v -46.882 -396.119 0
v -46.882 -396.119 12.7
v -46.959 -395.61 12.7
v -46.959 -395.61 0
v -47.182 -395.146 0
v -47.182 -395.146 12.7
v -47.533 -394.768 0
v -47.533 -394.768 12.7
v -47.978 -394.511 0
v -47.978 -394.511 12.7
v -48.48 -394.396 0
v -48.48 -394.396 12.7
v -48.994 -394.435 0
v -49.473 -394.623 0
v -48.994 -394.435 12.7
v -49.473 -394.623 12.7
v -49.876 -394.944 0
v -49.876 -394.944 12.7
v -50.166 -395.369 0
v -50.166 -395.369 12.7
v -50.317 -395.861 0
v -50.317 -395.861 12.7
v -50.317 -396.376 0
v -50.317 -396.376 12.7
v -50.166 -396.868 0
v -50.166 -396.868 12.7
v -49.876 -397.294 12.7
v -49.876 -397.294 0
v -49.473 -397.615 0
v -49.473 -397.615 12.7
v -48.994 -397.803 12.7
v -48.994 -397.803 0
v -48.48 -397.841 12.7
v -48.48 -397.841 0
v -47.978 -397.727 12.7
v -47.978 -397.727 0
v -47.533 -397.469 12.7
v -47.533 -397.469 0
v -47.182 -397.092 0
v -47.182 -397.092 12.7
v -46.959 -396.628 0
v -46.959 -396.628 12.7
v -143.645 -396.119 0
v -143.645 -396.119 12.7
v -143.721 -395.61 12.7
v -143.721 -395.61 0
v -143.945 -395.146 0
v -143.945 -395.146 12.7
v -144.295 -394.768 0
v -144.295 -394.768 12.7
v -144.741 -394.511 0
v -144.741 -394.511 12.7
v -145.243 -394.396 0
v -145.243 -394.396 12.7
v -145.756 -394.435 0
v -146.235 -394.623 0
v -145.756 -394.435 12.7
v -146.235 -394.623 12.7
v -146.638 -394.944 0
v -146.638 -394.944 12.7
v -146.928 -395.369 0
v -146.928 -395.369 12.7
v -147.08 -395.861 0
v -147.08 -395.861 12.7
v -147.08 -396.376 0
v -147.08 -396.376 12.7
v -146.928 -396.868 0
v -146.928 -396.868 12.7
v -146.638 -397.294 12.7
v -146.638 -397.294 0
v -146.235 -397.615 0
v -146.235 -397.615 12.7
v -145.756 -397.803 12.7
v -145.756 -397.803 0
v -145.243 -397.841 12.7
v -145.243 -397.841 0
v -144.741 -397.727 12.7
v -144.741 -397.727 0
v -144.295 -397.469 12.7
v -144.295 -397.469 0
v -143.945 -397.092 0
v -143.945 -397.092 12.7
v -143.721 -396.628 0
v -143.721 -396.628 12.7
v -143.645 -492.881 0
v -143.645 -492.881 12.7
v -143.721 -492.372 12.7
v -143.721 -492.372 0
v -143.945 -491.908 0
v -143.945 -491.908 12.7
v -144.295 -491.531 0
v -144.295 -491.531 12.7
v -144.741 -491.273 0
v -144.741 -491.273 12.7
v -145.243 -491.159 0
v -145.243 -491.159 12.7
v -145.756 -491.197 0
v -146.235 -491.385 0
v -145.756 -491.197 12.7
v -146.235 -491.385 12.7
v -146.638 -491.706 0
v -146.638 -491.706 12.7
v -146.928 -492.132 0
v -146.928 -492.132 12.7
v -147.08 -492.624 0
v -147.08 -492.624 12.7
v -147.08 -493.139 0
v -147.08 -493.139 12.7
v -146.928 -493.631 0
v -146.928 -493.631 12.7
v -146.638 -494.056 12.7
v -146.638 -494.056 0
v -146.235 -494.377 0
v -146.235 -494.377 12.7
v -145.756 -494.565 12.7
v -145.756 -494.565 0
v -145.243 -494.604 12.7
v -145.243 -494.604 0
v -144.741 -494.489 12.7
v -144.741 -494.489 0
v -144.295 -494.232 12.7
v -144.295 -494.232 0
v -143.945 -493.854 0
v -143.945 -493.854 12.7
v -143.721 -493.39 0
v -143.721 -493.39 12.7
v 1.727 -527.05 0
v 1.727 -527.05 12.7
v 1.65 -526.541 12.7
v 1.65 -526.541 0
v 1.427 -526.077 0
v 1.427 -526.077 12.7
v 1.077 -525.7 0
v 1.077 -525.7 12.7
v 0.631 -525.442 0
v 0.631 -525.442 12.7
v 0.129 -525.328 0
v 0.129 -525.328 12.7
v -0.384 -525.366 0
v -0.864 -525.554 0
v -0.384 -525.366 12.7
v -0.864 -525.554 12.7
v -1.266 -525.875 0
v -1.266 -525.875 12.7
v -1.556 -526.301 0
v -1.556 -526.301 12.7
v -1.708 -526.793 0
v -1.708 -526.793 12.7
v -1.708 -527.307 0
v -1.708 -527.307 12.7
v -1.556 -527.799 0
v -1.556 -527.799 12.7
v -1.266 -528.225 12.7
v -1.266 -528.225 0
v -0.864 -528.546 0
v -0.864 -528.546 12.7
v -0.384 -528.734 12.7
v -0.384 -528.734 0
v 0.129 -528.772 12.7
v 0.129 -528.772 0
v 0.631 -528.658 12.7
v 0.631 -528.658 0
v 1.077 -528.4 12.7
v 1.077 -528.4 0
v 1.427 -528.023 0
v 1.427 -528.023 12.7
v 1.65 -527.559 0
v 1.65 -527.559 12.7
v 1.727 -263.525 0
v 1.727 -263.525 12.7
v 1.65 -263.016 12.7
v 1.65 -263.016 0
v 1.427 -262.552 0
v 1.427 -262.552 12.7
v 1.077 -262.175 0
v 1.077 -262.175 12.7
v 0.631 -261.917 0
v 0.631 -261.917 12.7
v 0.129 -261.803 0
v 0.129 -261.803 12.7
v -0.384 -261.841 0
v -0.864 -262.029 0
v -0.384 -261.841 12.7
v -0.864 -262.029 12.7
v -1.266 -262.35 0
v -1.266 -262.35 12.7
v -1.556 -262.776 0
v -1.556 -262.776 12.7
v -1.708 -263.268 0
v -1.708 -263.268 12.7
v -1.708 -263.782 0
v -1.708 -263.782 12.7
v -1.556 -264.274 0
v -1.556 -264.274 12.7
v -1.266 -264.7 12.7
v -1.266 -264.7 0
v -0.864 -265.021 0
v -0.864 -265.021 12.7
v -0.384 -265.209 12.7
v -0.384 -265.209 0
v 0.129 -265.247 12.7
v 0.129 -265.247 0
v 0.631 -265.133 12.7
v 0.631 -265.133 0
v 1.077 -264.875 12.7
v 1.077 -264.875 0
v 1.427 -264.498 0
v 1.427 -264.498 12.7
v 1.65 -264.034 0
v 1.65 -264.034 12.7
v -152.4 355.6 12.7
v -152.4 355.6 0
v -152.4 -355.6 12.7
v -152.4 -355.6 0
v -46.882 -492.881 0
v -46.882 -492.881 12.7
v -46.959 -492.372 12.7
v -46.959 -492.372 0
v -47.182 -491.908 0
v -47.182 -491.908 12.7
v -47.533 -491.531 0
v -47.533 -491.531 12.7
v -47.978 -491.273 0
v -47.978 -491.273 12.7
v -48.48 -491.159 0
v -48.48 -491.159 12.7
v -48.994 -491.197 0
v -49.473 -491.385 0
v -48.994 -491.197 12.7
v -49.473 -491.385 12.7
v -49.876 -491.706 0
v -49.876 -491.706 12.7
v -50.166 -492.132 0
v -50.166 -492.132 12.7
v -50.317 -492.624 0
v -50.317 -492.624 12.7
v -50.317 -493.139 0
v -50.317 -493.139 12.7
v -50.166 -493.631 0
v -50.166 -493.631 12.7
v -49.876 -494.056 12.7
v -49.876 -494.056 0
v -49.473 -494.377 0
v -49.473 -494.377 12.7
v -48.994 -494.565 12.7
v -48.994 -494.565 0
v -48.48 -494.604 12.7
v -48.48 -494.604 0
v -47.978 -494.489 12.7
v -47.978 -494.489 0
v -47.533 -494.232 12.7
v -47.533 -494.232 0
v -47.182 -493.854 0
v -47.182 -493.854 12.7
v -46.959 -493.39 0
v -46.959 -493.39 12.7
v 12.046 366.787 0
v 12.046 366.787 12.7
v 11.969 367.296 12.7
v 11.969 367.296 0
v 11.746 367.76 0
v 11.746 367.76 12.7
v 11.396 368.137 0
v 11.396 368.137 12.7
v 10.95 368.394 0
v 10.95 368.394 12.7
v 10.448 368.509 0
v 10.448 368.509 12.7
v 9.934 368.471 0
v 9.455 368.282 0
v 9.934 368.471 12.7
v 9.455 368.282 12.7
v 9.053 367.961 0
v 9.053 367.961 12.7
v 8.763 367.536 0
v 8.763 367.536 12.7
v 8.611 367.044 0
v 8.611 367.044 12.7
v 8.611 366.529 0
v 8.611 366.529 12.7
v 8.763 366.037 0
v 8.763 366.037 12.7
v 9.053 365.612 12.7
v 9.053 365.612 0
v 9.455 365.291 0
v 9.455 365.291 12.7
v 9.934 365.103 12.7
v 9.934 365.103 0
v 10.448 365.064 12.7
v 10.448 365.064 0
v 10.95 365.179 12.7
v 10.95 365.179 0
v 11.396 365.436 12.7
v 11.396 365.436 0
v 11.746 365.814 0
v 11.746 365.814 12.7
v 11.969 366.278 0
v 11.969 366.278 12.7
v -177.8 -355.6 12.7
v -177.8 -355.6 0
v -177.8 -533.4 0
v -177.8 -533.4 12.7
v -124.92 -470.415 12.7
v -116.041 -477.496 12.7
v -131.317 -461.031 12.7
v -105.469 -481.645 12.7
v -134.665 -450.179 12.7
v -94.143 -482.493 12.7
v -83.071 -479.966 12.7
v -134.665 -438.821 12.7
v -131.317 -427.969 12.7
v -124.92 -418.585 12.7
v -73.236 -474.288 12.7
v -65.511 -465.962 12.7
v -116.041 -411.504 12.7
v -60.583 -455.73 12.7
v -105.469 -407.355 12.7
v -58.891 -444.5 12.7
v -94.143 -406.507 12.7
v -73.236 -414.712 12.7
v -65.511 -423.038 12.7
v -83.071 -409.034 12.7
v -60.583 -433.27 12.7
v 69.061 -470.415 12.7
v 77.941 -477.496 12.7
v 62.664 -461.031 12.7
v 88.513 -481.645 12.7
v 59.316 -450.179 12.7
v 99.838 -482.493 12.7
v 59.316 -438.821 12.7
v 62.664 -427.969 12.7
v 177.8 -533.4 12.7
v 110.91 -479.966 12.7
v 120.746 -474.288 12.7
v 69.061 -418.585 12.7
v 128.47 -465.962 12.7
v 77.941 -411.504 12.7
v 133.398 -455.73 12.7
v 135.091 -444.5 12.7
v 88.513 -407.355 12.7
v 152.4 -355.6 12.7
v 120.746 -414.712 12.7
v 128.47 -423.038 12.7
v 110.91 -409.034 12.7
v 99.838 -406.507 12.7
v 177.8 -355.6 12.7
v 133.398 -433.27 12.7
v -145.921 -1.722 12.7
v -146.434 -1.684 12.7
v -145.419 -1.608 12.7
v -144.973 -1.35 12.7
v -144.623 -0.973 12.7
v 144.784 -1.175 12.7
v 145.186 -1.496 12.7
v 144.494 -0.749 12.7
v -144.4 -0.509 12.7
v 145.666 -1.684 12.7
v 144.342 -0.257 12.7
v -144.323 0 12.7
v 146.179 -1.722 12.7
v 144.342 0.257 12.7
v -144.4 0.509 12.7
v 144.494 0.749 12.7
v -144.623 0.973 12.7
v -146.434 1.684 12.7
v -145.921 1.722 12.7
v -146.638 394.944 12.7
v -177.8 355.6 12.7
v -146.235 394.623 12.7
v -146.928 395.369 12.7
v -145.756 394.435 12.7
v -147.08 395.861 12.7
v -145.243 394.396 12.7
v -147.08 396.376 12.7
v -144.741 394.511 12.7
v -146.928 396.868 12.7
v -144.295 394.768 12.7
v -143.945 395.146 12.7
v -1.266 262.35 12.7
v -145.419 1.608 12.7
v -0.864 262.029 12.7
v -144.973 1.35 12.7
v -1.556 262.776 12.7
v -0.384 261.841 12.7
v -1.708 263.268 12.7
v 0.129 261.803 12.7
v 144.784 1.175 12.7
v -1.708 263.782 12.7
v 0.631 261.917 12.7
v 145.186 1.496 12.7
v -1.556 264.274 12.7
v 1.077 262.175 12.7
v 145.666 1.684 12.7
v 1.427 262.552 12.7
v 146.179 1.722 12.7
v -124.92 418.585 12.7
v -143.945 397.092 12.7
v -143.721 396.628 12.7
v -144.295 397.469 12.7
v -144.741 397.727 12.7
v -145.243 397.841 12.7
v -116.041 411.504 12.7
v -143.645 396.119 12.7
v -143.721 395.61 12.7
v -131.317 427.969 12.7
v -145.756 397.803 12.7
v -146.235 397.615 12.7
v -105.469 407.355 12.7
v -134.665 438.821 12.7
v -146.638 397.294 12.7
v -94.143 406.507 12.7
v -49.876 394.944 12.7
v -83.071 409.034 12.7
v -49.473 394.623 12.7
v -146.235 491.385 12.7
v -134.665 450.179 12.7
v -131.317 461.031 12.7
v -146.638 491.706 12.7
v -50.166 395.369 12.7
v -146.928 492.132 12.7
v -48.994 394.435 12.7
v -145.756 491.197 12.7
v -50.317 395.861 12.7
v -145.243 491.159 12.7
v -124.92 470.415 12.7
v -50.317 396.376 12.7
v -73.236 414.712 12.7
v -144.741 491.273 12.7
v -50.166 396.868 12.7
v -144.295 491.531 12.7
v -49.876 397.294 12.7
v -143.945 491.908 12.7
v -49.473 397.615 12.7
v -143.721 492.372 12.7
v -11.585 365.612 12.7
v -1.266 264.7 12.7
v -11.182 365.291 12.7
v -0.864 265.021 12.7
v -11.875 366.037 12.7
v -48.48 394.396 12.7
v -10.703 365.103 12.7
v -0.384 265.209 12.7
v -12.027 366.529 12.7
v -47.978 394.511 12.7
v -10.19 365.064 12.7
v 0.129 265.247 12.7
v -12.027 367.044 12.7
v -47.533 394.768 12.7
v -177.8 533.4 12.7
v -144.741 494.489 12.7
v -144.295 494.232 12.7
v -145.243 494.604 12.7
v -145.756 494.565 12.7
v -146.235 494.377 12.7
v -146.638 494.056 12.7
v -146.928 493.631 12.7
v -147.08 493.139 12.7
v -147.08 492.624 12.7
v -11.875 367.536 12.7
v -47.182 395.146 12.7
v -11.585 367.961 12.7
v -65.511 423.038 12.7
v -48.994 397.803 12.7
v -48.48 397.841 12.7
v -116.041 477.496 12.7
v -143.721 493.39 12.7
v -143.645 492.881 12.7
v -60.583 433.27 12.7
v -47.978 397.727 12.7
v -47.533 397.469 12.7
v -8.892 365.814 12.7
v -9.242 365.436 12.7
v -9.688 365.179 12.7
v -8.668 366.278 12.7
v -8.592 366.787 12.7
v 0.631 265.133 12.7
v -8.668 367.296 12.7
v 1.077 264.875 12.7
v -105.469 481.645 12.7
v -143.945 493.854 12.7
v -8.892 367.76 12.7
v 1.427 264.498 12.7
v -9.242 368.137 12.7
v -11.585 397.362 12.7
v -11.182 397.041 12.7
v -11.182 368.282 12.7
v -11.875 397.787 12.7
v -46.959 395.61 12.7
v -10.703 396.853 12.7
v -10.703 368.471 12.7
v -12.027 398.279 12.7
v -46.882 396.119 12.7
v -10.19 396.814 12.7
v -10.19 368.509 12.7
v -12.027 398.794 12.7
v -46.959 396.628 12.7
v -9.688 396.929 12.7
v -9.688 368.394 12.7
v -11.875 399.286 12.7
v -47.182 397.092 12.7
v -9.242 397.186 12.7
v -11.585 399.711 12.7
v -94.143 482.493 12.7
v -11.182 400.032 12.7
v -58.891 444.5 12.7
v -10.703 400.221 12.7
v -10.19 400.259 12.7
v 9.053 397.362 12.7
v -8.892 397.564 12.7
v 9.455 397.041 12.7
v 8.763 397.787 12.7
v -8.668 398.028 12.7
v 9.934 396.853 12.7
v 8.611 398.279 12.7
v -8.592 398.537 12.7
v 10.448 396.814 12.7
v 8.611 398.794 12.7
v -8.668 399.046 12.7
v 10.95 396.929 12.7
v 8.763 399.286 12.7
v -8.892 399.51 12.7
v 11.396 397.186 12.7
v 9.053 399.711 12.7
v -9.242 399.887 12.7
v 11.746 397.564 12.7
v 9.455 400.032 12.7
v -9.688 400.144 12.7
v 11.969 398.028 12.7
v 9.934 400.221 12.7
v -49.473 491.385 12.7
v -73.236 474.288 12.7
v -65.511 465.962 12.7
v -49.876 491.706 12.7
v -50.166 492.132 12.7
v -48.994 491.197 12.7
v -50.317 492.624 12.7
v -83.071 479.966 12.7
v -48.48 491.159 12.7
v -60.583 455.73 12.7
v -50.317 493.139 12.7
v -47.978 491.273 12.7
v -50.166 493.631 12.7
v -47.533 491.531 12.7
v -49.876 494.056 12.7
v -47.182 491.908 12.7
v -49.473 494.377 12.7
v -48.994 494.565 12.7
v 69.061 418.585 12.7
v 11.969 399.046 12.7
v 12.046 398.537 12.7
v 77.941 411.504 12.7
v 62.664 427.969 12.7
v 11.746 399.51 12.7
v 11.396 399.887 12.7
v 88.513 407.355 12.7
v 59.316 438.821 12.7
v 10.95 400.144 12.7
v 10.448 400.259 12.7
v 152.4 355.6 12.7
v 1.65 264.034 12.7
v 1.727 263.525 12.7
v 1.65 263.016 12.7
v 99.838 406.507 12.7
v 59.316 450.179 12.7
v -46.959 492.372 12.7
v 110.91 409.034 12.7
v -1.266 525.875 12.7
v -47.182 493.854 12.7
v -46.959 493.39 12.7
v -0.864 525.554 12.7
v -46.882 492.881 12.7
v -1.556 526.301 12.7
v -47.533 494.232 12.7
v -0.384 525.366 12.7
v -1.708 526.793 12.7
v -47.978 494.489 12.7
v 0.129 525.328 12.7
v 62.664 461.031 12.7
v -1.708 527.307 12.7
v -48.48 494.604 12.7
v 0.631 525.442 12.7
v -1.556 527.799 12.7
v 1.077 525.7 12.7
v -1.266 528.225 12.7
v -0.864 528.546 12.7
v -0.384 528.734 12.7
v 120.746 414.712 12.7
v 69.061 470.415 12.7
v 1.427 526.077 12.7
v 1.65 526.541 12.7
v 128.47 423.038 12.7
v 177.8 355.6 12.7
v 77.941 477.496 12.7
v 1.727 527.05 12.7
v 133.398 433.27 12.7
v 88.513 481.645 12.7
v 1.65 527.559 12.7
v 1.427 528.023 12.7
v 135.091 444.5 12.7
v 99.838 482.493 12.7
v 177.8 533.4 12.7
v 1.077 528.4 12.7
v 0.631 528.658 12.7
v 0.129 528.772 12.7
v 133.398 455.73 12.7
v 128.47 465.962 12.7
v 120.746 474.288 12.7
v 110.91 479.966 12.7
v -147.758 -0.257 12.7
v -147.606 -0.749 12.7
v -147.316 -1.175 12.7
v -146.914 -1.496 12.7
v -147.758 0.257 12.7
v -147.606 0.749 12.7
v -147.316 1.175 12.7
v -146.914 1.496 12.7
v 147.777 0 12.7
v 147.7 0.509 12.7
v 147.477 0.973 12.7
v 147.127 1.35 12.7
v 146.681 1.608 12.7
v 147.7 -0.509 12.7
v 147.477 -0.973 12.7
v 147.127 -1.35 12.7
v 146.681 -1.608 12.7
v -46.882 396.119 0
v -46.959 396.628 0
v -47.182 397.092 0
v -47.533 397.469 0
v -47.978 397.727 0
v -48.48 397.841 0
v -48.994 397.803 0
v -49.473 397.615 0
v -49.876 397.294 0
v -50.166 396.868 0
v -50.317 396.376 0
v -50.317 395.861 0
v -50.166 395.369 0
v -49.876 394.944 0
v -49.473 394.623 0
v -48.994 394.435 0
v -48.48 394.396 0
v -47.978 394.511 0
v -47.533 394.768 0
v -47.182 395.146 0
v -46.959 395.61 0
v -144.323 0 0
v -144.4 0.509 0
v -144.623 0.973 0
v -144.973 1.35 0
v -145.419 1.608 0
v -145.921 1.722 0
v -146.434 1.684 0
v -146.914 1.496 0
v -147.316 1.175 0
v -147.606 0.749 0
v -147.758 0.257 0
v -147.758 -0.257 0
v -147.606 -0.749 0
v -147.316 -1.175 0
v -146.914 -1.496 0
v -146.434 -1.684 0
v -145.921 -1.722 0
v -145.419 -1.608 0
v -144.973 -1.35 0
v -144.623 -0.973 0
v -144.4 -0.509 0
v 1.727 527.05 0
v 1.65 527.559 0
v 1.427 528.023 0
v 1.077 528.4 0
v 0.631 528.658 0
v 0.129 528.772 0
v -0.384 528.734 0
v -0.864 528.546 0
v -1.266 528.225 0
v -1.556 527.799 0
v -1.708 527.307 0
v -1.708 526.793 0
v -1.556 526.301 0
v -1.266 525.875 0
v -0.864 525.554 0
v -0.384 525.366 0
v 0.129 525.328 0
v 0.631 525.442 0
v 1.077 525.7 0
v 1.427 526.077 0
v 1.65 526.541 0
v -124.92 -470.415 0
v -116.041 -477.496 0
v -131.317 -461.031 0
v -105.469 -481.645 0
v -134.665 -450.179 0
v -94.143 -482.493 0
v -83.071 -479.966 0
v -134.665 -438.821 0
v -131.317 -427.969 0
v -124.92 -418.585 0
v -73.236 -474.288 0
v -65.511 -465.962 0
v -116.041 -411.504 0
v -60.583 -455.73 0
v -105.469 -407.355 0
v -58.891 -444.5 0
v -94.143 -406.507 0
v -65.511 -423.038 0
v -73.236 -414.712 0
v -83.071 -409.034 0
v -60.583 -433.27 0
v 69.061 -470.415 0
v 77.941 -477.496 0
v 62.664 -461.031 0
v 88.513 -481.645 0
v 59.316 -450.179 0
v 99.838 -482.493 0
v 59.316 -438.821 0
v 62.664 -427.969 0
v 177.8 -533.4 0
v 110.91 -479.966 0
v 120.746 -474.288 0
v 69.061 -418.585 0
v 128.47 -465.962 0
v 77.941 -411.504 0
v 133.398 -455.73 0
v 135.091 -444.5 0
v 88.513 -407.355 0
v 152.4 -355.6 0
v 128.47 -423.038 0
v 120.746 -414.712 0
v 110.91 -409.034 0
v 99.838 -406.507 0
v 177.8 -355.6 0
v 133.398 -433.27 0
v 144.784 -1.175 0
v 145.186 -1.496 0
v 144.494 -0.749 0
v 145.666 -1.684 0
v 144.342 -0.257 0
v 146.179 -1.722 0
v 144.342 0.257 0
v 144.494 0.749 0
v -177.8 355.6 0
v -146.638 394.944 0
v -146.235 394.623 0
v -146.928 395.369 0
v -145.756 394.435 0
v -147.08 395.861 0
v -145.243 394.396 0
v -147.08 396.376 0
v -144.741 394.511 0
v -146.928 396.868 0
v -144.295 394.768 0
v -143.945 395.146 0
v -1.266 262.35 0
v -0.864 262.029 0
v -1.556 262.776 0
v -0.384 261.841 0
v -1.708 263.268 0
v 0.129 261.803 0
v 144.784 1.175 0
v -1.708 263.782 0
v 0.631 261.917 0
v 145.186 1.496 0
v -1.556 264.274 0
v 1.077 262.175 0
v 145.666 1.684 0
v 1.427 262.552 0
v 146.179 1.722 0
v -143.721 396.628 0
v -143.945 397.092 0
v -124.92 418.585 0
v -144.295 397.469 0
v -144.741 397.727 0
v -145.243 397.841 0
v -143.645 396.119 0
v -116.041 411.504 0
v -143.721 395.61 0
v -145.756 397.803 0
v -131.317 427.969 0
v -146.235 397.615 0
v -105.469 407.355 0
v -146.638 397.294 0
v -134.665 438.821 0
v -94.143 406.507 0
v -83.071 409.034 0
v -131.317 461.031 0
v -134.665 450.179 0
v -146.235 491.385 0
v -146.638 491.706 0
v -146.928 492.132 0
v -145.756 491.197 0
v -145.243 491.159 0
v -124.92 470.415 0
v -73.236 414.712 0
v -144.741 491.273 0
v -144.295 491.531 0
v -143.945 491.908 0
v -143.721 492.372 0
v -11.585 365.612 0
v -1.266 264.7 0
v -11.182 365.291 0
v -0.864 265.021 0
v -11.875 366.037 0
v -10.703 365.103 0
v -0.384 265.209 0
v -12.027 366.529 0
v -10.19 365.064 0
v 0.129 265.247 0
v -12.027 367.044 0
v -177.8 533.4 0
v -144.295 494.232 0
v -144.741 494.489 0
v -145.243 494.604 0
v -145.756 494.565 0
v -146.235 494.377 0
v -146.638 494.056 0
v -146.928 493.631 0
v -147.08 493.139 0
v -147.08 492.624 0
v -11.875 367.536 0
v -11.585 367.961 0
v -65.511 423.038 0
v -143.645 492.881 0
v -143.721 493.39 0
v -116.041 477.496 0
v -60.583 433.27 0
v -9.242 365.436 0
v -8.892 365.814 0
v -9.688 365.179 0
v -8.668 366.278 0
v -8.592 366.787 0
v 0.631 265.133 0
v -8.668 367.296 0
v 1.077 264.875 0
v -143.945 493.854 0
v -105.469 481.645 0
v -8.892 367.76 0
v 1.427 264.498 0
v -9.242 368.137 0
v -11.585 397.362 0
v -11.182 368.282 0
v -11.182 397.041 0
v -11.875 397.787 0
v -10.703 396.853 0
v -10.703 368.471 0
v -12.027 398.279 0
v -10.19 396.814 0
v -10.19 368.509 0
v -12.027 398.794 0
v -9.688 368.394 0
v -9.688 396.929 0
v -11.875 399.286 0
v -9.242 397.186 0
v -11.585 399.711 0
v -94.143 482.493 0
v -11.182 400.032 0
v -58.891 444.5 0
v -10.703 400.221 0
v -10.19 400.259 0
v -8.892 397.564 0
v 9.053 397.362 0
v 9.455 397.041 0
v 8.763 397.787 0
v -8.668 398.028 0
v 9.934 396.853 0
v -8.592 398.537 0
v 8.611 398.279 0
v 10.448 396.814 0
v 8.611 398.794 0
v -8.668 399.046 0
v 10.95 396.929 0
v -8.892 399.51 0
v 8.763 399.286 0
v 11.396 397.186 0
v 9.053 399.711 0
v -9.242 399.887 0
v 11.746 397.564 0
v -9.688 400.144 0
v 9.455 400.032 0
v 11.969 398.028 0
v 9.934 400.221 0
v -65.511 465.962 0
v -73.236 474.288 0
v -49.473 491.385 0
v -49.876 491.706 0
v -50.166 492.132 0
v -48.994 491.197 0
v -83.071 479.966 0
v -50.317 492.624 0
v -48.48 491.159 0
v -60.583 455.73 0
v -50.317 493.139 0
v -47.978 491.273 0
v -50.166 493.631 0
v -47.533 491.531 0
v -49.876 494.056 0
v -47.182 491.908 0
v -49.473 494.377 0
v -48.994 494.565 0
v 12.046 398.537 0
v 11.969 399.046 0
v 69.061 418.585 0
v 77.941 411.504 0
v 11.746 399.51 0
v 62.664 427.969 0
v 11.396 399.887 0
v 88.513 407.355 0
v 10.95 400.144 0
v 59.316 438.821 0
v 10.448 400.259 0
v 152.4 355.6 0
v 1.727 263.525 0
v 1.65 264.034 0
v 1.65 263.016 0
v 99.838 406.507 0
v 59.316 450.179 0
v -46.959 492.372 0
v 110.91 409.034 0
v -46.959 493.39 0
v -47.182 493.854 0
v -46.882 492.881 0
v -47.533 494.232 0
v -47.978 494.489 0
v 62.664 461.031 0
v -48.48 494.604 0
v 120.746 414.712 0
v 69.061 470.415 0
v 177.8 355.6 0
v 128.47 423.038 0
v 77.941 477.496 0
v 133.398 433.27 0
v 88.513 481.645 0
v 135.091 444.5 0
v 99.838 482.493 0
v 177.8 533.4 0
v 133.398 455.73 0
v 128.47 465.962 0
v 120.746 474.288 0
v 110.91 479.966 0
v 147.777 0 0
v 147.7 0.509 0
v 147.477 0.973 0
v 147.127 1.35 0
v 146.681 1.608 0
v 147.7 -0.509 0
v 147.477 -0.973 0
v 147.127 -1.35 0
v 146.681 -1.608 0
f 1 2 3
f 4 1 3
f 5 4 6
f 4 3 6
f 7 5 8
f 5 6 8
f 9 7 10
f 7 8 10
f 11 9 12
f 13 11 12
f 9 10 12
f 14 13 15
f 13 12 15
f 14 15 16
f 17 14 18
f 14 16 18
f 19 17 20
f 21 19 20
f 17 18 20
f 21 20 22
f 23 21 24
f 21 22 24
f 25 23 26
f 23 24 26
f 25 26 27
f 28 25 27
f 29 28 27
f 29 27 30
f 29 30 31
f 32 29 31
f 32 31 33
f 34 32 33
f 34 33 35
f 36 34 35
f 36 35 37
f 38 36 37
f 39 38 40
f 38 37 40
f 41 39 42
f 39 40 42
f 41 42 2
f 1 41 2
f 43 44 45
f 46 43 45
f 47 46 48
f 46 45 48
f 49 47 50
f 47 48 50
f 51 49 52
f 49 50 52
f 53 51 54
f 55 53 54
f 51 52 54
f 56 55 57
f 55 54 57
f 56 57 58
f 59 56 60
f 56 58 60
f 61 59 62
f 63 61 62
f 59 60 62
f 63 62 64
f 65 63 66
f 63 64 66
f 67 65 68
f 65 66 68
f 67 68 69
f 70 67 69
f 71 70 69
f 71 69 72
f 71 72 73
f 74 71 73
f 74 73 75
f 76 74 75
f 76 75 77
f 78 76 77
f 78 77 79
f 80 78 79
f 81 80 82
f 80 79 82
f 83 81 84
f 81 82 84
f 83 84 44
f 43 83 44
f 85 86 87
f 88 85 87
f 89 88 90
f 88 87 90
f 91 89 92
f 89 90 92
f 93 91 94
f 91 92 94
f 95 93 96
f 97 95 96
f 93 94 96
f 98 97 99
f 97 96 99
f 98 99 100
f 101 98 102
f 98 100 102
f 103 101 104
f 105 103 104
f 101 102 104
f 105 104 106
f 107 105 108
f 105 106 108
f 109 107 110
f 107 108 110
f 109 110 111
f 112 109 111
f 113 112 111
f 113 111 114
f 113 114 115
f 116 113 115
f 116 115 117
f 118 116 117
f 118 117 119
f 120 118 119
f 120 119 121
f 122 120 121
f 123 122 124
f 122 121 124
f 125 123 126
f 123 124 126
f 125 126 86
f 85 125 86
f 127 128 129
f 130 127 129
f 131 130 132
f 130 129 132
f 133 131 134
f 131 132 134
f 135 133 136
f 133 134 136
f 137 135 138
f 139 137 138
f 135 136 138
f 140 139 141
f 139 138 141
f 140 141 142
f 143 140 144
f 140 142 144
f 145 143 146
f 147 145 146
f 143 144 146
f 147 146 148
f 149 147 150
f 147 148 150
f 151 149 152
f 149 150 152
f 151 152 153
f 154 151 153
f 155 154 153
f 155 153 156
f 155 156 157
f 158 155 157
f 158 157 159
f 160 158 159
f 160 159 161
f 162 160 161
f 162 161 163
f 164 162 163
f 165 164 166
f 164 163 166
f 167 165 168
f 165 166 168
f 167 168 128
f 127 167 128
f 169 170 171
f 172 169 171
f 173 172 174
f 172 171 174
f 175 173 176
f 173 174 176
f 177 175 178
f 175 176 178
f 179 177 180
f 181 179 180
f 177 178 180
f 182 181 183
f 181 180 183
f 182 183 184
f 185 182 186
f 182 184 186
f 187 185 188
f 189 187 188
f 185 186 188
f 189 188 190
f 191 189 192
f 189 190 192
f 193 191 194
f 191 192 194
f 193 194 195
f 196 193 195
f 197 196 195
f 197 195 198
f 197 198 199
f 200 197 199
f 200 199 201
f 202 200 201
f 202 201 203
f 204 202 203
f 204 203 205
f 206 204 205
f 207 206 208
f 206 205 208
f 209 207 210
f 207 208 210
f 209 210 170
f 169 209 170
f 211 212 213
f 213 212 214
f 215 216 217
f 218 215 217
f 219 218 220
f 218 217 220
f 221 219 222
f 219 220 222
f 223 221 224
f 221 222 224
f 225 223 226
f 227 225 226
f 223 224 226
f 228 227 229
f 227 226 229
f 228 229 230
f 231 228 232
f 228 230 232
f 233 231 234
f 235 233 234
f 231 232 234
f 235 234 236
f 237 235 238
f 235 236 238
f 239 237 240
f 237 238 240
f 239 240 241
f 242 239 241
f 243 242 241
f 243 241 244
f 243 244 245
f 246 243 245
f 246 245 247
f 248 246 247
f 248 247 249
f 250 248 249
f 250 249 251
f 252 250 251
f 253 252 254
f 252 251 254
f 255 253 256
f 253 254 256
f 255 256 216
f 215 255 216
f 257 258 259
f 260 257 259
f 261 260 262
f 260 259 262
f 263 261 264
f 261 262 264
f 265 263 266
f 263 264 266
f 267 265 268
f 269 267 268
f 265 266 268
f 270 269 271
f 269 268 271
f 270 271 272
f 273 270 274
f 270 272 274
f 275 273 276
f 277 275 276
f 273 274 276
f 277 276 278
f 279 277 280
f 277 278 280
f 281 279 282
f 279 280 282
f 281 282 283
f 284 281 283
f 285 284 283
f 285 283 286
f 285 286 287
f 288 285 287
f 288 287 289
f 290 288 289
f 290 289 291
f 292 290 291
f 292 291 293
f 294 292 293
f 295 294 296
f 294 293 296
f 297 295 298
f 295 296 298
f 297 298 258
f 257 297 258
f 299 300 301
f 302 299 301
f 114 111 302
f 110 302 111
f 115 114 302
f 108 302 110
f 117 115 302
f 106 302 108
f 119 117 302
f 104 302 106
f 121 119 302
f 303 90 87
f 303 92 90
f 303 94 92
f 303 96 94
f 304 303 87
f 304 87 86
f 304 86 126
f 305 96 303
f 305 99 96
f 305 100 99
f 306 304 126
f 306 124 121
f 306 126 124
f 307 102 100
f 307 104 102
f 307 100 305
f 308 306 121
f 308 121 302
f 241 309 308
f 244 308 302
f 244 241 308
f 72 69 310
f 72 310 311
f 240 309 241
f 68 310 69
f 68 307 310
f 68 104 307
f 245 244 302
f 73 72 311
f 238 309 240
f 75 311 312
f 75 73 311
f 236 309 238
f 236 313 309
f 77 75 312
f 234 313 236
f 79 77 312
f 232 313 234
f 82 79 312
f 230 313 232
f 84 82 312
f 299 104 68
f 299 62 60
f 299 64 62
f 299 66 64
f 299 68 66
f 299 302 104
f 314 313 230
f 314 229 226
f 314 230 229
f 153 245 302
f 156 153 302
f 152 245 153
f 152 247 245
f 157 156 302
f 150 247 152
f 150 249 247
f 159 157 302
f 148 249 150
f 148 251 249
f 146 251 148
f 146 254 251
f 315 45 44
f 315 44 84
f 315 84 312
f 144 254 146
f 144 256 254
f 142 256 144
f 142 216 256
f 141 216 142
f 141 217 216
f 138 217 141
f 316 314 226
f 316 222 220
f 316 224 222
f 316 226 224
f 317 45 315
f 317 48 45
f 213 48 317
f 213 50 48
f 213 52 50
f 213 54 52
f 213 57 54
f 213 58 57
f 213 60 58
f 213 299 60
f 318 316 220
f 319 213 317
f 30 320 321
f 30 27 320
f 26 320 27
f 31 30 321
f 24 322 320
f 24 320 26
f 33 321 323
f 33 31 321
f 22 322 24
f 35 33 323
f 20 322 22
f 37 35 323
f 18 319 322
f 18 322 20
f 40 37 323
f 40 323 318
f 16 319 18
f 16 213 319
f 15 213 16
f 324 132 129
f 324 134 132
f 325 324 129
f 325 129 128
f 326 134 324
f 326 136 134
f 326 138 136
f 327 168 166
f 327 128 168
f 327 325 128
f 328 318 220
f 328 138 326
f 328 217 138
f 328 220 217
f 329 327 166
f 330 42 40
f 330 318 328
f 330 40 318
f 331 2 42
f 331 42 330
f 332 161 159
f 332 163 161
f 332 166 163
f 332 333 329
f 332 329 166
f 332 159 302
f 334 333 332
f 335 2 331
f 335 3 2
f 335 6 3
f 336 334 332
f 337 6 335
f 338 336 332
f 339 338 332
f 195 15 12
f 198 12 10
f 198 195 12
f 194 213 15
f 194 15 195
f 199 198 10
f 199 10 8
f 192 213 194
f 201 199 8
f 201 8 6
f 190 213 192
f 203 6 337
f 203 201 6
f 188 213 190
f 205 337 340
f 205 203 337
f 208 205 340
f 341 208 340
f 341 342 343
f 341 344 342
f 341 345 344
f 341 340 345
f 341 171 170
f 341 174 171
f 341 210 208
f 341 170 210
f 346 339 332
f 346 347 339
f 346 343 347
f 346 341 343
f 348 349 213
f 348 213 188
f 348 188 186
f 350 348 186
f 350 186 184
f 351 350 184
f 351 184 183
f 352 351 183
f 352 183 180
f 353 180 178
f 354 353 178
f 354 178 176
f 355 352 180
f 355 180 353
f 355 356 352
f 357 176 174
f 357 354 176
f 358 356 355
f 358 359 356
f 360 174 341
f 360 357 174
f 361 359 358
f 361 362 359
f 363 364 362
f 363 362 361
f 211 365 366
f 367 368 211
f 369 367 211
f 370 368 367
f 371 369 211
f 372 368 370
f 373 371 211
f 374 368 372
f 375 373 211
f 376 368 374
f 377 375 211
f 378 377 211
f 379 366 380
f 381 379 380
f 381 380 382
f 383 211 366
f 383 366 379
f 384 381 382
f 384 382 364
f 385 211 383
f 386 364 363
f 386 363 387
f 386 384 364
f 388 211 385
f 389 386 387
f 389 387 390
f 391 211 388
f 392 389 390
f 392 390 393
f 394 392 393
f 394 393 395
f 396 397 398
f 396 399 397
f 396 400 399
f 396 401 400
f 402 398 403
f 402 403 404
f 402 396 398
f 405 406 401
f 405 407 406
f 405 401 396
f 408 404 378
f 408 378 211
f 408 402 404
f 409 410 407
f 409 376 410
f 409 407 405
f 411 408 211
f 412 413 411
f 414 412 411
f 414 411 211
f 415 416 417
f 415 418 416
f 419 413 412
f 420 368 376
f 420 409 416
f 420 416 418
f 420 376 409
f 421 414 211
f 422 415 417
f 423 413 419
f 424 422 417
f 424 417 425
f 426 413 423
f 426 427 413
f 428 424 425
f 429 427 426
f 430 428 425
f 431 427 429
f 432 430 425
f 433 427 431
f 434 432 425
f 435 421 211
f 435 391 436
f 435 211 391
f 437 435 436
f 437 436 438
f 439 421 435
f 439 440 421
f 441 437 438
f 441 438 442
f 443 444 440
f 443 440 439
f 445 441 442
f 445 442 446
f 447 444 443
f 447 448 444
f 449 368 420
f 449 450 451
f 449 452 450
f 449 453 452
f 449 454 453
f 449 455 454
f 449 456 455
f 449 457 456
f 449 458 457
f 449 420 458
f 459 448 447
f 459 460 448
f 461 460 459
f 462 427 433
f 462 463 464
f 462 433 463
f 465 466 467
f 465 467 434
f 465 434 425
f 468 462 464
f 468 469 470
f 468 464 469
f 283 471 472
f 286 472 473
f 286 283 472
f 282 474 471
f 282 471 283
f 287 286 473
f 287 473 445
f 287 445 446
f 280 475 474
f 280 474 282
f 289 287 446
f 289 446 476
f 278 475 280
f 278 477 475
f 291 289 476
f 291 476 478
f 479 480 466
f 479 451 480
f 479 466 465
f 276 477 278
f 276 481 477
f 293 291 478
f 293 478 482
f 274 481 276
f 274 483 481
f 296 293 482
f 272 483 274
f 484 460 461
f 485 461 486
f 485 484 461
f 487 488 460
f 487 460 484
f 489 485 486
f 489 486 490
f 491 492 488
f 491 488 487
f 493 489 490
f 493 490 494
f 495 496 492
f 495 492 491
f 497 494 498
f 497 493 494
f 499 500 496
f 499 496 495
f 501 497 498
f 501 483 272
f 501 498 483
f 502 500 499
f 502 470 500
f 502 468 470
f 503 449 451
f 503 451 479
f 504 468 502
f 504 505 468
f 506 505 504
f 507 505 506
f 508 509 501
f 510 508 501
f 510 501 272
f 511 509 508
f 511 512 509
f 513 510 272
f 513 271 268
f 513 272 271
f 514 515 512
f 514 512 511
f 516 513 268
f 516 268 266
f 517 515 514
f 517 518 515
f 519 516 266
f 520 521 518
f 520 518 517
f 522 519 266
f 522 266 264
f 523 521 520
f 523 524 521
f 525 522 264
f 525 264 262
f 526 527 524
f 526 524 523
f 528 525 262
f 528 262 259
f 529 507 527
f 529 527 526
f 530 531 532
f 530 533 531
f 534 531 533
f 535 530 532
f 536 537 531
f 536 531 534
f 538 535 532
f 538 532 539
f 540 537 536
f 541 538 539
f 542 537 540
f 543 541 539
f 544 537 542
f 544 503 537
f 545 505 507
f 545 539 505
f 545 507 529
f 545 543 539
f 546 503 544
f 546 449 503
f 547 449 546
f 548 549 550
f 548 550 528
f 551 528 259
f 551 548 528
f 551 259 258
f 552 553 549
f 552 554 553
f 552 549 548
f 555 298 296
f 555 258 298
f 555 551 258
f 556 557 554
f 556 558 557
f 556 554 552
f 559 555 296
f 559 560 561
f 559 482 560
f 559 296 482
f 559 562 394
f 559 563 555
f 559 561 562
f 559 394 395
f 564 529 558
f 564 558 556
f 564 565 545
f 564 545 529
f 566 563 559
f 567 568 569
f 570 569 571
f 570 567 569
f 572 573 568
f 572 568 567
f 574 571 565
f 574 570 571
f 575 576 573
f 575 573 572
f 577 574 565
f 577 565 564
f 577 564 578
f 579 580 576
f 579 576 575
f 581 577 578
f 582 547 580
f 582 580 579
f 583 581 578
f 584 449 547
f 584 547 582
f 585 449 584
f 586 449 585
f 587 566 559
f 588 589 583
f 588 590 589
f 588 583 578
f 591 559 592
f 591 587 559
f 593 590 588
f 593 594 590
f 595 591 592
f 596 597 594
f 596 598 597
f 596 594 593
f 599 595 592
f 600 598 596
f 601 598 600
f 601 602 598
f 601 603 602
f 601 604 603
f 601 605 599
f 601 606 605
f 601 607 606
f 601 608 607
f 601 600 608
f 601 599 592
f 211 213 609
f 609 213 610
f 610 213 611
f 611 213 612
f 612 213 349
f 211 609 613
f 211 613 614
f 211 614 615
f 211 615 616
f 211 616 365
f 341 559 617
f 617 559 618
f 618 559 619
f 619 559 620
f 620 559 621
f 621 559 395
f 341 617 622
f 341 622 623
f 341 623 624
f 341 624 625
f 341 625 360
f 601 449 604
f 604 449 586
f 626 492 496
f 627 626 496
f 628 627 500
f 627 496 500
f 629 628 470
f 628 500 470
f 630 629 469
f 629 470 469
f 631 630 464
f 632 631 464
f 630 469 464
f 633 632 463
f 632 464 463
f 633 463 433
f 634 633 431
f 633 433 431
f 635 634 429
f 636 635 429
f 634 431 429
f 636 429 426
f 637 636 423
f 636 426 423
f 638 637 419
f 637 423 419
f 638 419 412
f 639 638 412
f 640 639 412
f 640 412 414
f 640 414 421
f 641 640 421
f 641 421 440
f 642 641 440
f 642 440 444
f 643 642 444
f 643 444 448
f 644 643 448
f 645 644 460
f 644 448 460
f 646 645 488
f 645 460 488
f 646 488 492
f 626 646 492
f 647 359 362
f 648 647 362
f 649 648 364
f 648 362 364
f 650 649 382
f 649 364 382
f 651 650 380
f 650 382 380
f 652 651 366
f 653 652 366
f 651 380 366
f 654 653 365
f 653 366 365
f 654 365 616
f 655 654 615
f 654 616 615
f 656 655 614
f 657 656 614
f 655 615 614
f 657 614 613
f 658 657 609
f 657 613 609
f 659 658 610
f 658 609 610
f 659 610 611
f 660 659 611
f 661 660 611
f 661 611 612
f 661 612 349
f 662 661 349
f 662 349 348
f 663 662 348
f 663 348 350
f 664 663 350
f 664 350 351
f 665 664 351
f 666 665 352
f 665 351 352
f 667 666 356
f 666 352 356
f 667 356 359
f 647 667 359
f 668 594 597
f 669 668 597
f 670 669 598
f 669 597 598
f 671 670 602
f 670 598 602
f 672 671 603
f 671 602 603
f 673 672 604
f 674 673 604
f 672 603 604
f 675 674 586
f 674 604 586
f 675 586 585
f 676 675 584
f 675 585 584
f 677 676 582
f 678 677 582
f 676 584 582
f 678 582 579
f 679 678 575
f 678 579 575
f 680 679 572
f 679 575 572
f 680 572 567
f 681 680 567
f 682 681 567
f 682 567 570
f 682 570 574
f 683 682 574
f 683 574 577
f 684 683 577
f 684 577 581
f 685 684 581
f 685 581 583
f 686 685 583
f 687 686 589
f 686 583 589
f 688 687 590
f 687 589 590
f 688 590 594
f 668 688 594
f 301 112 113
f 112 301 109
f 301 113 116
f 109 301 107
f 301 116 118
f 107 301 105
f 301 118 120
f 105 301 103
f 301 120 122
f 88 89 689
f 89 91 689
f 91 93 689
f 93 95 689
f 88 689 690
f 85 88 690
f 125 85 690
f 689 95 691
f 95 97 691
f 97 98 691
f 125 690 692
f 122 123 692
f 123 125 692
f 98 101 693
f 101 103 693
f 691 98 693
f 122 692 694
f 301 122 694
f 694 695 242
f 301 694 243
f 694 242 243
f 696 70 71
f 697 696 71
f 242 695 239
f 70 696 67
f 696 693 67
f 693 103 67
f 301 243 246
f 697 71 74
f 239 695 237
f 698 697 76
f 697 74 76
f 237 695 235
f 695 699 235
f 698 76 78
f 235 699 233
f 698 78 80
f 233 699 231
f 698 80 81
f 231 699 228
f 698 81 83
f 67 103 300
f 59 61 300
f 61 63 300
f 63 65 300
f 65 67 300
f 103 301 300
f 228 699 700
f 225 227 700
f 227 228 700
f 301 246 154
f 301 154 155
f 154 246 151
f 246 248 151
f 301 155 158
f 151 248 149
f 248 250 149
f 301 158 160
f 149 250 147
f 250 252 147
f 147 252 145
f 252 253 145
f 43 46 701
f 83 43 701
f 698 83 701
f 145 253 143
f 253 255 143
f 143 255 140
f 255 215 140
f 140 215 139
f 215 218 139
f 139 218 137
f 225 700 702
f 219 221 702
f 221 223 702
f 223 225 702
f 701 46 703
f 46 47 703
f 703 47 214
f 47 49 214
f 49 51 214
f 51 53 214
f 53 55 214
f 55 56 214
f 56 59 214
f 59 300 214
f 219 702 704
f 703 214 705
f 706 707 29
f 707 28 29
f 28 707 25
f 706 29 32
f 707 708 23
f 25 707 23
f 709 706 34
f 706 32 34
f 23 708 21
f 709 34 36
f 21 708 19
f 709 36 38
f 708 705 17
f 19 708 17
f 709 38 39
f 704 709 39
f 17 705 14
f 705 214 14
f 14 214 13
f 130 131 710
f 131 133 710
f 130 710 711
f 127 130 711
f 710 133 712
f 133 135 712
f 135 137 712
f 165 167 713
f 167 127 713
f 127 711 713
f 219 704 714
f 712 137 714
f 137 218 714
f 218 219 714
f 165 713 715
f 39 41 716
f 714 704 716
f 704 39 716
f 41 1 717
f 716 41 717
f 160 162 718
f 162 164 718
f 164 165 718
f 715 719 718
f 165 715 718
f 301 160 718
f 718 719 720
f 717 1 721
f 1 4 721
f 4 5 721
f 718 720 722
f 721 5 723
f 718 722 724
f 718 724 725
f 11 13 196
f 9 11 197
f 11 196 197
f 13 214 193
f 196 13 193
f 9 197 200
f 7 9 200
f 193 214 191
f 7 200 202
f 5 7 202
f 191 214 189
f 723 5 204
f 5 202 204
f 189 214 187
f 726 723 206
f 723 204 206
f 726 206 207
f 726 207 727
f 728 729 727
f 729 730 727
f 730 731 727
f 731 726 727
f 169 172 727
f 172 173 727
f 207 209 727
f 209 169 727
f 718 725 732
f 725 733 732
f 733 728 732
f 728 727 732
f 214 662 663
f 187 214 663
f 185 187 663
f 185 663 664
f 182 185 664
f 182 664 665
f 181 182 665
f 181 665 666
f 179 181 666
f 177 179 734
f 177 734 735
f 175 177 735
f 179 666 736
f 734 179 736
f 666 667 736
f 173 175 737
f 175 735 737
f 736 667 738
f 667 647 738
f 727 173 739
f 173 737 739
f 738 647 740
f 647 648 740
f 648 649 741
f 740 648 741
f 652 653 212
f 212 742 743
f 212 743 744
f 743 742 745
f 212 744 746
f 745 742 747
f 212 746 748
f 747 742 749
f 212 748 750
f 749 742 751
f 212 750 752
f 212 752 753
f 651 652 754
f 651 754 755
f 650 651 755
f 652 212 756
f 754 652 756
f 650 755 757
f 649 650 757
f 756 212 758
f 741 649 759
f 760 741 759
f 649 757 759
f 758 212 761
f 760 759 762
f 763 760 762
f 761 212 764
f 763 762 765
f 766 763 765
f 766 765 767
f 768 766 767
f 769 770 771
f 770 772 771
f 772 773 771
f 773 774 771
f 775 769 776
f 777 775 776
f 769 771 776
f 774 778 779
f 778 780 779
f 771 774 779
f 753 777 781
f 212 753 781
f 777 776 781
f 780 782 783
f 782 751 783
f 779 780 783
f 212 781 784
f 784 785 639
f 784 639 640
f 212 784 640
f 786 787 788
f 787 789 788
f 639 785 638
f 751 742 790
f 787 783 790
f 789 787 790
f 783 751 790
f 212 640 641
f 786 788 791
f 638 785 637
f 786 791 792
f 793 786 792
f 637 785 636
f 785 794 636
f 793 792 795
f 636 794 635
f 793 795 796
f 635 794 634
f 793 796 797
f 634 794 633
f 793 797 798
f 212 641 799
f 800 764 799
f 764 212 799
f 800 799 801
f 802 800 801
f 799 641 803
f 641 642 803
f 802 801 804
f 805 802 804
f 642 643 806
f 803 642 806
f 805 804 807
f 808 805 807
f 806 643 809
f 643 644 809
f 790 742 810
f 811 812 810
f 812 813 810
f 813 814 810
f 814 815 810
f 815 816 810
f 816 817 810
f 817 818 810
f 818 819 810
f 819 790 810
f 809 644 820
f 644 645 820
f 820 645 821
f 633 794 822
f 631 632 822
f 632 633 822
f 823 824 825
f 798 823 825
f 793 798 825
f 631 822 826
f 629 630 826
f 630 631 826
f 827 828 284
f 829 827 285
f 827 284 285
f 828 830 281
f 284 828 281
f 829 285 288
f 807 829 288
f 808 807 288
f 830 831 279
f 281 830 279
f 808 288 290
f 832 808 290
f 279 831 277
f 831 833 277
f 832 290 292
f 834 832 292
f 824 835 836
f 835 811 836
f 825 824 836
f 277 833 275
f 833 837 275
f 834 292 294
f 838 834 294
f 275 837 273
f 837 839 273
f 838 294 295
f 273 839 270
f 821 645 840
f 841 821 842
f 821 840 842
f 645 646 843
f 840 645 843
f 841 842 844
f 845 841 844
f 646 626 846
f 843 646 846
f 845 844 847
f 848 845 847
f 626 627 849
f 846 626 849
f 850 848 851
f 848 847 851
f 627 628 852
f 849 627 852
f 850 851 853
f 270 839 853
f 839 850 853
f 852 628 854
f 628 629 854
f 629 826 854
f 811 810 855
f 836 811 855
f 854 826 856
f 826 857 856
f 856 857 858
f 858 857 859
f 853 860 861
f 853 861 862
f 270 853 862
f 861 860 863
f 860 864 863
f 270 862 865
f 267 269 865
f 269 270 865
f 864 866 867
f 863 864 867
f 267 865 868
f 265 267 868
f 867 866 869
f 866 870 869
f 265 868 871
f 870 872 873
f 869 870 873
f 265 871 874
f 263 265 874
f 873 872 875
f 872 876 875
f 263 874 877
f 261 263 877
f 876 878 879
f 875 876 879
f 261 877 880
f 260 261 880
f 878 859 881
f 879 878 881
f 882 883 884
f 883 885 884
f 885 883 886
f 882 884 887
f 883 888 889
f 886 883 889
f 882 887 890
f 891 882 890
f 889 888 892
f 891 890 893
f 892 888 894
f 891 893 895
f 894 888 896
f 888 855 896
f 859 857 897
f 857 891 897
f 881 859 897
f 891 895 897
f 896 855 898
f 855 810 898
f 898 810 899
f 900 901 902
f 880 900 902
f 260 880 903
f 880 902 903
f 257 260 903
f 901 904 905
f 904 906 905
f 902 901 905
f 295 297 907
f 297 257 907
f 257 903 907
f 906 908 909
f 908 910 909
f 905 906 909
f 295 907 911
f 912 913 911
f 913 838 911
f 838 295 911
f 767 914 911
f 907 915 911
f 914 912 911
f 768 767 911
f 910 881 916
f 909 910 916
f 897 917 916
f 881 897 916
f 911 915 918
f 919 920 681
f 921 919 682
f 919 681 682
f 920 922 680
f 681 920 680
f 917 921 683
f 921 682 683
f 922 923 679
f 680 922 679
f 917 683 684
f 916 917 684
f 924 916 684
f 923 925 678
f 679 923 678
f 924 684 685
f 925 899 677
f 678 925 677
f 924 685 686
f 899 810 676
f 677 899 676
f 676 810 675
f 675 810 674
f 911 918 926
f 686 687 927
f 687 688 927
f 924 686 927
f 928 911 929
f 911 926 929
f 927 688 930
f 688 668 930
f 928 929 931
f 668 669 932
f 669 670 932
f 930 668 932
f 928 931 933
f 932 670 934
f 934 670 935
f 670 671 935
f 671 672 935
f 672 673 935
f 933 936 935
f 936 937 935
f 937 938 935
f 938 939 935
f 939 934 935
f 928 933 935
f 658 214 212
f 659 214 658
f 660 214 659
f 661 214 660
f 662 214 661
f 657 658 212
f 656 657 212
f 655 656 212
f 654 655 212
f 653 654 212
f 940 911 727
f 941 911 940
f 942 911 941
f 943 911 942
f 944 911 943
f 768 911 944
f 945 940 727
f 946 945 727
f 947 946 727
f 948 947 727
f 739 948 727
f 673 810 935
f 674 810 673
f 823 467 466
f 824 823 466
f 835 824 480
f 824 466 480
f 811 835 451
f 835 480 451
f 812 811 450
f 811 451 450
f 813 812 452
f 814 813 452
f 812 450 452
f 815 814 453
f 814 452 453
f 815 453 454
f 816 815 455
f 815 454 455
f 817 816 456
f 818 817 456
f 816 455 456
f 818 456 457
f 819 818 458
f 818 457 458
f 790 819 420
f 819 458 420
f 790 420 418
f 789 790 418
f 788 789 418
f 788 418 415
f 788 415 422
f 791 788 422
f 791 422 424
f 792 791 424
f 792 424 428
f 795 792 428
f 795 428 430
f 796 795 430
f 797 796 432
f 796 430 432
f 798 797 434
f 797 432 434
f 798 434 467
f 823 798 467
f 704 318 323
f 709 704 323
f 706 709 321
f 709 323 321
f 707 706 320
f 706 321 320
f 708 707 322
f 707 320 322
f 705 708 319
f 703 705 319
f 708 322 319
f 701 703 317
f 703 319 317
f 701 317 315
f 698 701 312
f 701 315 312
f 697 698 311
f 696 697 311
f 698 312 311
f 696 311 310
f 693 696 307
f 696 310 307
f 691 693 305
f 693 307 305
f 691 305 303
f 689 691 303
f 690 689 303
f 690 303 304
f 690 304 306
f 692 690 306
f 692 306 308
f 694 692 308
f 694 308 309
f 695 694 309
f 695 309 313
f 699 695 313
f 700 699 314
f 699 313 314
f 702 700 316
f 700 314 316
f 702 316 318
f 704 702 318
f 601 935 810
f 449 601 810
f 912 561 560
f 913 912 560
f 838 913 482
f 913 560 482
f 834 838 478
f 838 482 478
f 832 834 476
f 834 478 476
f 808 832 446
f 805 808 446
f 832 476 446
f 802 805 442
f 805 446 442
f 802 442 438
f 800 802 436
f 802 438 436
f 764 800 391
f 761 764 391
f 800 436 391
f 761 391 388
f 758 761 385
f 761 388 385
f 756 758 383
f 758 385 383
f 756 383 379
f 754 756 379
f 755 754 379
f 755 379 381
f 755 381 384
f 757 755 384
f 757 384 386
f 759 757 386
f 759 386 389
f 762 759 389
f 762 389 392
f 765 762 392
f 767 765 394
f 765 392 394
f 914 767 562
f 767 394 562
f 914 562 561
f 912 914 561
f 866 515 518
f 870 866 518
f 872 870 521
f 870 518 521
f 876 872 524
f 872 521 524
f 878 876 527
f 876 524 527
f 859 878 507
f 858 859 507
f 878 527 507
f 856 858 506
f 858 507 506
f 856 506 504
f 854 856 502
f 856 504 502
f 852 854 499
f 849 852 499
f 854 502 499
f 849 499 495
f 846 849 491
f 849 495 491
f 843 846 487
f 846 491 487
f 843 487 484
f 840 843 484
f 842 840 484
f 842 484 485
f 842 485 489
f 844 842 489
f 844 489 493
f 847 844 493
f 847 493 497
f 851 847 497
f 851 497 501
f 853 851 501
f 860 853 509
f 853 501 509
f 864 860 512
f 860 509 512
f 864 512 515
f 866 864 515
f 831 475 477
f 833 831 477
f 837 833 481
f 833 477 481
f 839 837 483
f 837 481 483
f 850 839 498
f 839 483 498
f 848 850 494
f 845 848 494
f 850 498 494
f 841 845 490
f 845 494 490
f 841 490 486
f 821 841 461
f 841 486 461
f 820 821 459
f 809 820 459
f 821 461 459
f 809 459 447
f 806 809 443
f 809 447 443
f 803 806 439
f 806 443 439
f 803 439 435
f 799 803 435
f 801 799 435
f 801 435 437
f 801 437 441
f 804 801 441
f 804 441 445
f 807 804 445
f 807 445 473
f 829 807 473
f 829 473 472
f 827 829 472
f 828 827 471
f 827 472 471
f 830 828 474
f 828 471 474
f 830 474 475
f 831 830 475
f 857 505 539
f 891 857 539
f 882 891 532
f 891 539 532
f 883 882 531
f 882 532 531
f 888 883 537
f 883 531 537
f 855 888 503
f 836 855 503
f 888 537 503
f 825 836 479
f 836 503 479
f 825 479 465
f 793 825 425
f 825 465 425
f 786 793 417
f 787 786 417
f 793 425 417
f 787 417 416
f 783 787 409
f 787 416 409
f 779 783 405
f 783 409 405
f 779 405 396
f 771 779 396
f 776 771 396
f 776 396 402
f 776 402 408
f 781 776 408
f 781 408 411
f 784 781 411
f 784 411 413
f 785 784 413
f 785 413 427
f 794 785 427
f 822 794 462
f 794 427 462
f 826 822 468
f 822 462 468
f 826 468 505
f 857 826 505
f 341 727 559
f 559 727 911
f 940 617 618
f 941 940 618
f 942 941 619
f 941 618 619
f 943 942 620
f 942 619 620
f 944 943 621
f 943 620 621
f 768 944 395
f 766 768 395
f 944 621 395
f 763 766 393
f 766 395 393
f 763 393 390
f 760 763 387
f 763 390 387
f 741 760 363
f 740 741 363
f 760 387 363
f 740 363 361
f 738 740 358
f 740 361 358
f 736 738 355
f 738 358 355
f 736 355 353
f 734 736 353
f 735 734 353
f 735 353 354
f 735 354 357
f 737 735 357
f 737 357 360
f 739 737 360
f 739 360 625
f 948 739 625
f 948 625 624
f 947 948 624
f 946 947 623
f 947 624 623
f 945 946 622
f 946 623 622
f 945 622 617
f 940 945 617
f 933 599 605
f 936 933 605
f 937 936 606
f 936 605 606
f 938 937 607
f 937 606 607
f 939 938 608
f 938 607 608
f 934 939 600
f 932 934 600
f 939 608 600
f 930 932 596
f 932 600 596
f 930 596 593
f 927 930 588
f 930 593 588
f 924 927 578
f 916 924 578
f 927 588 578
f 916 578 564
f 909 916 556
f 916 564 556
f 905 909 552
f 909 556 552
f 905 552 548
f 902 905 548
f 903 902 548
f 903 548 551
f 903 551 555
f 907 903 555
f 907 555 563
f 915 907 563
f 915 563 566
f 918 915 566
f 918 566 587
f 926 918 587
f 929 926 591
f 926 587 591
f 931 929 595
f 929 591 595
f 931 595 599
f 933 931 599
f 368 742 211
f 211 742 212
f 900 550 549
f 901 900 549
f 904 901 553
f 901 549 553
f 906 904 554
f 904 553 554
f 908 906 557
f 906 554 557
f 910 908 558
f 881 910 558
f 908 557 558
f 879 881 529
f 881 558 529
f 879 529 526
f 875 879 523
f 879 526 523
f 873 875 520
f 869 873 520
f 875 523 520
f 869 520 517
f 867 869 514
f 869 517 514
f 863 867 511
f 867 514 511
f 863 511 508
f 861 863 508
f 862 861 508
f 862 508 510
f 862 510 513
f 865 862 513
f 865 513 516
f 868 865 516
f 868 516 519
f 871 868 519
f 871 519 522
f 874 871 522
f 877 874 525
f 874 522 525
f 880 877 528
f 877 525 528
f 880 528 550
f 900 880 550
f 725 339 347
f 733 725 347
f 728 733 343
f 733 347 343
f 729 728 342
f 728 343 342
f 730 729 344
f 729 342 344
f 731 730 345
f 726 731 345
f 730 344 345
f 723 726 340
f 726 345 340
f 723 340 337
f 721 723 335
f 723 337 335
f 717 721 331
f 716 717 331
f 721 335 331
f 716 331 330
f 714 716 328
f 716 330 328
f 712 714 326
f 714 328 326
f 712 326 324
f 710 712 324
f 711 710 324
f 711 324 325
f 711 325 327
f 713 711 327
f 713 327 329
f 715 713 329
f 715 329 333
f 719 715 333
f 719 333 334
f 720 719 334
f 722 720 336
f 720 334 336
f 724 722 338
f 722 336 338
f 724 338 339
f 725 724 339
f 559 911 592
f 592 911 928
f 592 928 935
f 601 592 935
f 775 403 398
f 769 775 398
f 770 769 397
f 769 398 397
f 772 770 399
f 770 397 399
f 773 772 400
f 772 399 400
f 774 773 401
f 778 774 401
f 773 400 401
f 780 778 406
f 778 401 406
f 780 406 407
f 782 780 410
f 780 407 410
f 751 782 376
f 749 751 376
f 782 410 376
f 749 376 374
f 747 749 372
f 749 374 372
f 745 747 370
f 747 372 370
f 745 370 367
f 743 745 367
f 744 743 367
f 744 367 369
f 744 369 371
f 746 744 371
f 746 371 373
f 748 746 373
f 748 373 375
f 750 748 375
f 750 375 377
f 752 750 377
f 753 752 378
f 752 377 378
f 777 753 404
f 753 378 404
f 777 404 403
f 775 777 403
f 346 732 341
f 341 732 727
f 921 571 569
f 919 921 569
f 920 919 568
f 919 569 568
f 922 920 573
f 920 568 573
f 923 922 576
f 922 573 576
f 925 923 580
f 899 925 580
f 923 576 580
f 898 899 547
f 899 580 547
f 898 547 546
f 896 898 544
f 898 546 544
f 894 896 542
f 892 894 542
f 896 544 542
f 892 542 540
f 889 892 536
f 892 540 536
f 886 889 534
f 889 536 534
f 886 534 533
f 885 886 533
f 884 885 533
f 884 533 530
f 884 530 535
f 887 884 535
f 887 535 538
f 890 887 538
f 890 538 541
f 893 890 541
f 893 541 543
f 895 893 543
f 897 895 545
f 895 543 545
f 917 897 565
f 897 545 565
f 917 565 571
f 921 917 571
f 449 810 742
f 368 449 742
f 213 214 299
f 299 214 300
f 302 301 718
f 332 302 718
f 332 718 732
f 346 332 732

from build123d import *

# Parameters (mm, degrees)
F1_DEPTH = 12.7
F2_R     = 1.7272
F2_R_2   = 38.1
F3_DEPTH = 12.7
F4_R     = 1.7272
F5_DEPTH = 12.7


with BuildPart() as f1:
    # F0 (on Top) → F1 (new body)
    with BuildSketch(Plane.XY):
        Polygon((-152.4, 355.6), (-152.4, -355.6), (-177.8, -355.6), (-177.8, -533.4), (177.8, -533.4), (177.8, -355.6), (152.4, -355.6), (152.4, 355.6), (177.8, 355.6), (177.8, 533.4), (-177.8, 533.4), (-177.8, 355.6), align=None)
    extrude(amount=F1_DEPTH)

    # F2 (on face) → F3 (cut, through all)
    with BuildSketch(Plane.XY.offset(12.7)):
        with Locations((-145.37171, 492.881133)):
            Circle(F2_R)
        with Locations((-48.609445, 492.881133)):
            Circle(F2_R)
        with Locations((-145.37171, 396.118867)):
            Circle(F2_R)
        with Locations((-48.609445, 396.118867)):
            Circle(F2_R)
        with Locations((-145.37171, -492.881133)):
            Circle(F2_R)
        with Locations((-145.37171, -396.118867)):
            Circle(F2_R)
        with Locations((-48.609445, -492.881133)):
            Circle(F2_R)
        with Locations((-48.609445, -396.118867)):
            Circle(F2_R)
        with Locations((-96.990578, -444.5)):
            Circle(F2_R_2)
        with Locations((96.990578, -444.5)):
            Circle(F2_R_2)
        with Locations((-96.990578, 444.5)):
            Circle(F2_R_2)
        with Locations((96.990578, 444.5)):
            Circle(F2_R_2)
        with Locations((-10.31875, 366.786655)):
            Circle(F2_R)
        with Locations((10.31875, 398.536655)):
            Circle(F2_R)
        with Locations((10.31875, 366.786655)):
            Circle(F2_R)
        with Locations((-10.31875, 398.536655)):
            Circle(F2_R)
    extrude(amount=-F3_DEPTH, mode=Mode.SUBTRACT)

    # F4 (on face) → F5 (cut, through all)
    with BuildSketch(Plane.XY.offset(12.7)):
        with Locations((0, 263.525)):
            Circle(F4_R)
        with Locations((-146.05, 0)):
            Circle(F4_R)
        with Locations((146.05, 0)):
            Circle(F4_R)
        with Locations((0, 527.05)):
            Circle(F4_R)
        with Locations((0, -263.525)):
            Circle(F4_R)
        with Locations((0, -527.05)):
            Circle(F4_R)
    extrude(amount=-F5_DEPTH, mode=Mode.SUBTRACT)


solid = f1.part
